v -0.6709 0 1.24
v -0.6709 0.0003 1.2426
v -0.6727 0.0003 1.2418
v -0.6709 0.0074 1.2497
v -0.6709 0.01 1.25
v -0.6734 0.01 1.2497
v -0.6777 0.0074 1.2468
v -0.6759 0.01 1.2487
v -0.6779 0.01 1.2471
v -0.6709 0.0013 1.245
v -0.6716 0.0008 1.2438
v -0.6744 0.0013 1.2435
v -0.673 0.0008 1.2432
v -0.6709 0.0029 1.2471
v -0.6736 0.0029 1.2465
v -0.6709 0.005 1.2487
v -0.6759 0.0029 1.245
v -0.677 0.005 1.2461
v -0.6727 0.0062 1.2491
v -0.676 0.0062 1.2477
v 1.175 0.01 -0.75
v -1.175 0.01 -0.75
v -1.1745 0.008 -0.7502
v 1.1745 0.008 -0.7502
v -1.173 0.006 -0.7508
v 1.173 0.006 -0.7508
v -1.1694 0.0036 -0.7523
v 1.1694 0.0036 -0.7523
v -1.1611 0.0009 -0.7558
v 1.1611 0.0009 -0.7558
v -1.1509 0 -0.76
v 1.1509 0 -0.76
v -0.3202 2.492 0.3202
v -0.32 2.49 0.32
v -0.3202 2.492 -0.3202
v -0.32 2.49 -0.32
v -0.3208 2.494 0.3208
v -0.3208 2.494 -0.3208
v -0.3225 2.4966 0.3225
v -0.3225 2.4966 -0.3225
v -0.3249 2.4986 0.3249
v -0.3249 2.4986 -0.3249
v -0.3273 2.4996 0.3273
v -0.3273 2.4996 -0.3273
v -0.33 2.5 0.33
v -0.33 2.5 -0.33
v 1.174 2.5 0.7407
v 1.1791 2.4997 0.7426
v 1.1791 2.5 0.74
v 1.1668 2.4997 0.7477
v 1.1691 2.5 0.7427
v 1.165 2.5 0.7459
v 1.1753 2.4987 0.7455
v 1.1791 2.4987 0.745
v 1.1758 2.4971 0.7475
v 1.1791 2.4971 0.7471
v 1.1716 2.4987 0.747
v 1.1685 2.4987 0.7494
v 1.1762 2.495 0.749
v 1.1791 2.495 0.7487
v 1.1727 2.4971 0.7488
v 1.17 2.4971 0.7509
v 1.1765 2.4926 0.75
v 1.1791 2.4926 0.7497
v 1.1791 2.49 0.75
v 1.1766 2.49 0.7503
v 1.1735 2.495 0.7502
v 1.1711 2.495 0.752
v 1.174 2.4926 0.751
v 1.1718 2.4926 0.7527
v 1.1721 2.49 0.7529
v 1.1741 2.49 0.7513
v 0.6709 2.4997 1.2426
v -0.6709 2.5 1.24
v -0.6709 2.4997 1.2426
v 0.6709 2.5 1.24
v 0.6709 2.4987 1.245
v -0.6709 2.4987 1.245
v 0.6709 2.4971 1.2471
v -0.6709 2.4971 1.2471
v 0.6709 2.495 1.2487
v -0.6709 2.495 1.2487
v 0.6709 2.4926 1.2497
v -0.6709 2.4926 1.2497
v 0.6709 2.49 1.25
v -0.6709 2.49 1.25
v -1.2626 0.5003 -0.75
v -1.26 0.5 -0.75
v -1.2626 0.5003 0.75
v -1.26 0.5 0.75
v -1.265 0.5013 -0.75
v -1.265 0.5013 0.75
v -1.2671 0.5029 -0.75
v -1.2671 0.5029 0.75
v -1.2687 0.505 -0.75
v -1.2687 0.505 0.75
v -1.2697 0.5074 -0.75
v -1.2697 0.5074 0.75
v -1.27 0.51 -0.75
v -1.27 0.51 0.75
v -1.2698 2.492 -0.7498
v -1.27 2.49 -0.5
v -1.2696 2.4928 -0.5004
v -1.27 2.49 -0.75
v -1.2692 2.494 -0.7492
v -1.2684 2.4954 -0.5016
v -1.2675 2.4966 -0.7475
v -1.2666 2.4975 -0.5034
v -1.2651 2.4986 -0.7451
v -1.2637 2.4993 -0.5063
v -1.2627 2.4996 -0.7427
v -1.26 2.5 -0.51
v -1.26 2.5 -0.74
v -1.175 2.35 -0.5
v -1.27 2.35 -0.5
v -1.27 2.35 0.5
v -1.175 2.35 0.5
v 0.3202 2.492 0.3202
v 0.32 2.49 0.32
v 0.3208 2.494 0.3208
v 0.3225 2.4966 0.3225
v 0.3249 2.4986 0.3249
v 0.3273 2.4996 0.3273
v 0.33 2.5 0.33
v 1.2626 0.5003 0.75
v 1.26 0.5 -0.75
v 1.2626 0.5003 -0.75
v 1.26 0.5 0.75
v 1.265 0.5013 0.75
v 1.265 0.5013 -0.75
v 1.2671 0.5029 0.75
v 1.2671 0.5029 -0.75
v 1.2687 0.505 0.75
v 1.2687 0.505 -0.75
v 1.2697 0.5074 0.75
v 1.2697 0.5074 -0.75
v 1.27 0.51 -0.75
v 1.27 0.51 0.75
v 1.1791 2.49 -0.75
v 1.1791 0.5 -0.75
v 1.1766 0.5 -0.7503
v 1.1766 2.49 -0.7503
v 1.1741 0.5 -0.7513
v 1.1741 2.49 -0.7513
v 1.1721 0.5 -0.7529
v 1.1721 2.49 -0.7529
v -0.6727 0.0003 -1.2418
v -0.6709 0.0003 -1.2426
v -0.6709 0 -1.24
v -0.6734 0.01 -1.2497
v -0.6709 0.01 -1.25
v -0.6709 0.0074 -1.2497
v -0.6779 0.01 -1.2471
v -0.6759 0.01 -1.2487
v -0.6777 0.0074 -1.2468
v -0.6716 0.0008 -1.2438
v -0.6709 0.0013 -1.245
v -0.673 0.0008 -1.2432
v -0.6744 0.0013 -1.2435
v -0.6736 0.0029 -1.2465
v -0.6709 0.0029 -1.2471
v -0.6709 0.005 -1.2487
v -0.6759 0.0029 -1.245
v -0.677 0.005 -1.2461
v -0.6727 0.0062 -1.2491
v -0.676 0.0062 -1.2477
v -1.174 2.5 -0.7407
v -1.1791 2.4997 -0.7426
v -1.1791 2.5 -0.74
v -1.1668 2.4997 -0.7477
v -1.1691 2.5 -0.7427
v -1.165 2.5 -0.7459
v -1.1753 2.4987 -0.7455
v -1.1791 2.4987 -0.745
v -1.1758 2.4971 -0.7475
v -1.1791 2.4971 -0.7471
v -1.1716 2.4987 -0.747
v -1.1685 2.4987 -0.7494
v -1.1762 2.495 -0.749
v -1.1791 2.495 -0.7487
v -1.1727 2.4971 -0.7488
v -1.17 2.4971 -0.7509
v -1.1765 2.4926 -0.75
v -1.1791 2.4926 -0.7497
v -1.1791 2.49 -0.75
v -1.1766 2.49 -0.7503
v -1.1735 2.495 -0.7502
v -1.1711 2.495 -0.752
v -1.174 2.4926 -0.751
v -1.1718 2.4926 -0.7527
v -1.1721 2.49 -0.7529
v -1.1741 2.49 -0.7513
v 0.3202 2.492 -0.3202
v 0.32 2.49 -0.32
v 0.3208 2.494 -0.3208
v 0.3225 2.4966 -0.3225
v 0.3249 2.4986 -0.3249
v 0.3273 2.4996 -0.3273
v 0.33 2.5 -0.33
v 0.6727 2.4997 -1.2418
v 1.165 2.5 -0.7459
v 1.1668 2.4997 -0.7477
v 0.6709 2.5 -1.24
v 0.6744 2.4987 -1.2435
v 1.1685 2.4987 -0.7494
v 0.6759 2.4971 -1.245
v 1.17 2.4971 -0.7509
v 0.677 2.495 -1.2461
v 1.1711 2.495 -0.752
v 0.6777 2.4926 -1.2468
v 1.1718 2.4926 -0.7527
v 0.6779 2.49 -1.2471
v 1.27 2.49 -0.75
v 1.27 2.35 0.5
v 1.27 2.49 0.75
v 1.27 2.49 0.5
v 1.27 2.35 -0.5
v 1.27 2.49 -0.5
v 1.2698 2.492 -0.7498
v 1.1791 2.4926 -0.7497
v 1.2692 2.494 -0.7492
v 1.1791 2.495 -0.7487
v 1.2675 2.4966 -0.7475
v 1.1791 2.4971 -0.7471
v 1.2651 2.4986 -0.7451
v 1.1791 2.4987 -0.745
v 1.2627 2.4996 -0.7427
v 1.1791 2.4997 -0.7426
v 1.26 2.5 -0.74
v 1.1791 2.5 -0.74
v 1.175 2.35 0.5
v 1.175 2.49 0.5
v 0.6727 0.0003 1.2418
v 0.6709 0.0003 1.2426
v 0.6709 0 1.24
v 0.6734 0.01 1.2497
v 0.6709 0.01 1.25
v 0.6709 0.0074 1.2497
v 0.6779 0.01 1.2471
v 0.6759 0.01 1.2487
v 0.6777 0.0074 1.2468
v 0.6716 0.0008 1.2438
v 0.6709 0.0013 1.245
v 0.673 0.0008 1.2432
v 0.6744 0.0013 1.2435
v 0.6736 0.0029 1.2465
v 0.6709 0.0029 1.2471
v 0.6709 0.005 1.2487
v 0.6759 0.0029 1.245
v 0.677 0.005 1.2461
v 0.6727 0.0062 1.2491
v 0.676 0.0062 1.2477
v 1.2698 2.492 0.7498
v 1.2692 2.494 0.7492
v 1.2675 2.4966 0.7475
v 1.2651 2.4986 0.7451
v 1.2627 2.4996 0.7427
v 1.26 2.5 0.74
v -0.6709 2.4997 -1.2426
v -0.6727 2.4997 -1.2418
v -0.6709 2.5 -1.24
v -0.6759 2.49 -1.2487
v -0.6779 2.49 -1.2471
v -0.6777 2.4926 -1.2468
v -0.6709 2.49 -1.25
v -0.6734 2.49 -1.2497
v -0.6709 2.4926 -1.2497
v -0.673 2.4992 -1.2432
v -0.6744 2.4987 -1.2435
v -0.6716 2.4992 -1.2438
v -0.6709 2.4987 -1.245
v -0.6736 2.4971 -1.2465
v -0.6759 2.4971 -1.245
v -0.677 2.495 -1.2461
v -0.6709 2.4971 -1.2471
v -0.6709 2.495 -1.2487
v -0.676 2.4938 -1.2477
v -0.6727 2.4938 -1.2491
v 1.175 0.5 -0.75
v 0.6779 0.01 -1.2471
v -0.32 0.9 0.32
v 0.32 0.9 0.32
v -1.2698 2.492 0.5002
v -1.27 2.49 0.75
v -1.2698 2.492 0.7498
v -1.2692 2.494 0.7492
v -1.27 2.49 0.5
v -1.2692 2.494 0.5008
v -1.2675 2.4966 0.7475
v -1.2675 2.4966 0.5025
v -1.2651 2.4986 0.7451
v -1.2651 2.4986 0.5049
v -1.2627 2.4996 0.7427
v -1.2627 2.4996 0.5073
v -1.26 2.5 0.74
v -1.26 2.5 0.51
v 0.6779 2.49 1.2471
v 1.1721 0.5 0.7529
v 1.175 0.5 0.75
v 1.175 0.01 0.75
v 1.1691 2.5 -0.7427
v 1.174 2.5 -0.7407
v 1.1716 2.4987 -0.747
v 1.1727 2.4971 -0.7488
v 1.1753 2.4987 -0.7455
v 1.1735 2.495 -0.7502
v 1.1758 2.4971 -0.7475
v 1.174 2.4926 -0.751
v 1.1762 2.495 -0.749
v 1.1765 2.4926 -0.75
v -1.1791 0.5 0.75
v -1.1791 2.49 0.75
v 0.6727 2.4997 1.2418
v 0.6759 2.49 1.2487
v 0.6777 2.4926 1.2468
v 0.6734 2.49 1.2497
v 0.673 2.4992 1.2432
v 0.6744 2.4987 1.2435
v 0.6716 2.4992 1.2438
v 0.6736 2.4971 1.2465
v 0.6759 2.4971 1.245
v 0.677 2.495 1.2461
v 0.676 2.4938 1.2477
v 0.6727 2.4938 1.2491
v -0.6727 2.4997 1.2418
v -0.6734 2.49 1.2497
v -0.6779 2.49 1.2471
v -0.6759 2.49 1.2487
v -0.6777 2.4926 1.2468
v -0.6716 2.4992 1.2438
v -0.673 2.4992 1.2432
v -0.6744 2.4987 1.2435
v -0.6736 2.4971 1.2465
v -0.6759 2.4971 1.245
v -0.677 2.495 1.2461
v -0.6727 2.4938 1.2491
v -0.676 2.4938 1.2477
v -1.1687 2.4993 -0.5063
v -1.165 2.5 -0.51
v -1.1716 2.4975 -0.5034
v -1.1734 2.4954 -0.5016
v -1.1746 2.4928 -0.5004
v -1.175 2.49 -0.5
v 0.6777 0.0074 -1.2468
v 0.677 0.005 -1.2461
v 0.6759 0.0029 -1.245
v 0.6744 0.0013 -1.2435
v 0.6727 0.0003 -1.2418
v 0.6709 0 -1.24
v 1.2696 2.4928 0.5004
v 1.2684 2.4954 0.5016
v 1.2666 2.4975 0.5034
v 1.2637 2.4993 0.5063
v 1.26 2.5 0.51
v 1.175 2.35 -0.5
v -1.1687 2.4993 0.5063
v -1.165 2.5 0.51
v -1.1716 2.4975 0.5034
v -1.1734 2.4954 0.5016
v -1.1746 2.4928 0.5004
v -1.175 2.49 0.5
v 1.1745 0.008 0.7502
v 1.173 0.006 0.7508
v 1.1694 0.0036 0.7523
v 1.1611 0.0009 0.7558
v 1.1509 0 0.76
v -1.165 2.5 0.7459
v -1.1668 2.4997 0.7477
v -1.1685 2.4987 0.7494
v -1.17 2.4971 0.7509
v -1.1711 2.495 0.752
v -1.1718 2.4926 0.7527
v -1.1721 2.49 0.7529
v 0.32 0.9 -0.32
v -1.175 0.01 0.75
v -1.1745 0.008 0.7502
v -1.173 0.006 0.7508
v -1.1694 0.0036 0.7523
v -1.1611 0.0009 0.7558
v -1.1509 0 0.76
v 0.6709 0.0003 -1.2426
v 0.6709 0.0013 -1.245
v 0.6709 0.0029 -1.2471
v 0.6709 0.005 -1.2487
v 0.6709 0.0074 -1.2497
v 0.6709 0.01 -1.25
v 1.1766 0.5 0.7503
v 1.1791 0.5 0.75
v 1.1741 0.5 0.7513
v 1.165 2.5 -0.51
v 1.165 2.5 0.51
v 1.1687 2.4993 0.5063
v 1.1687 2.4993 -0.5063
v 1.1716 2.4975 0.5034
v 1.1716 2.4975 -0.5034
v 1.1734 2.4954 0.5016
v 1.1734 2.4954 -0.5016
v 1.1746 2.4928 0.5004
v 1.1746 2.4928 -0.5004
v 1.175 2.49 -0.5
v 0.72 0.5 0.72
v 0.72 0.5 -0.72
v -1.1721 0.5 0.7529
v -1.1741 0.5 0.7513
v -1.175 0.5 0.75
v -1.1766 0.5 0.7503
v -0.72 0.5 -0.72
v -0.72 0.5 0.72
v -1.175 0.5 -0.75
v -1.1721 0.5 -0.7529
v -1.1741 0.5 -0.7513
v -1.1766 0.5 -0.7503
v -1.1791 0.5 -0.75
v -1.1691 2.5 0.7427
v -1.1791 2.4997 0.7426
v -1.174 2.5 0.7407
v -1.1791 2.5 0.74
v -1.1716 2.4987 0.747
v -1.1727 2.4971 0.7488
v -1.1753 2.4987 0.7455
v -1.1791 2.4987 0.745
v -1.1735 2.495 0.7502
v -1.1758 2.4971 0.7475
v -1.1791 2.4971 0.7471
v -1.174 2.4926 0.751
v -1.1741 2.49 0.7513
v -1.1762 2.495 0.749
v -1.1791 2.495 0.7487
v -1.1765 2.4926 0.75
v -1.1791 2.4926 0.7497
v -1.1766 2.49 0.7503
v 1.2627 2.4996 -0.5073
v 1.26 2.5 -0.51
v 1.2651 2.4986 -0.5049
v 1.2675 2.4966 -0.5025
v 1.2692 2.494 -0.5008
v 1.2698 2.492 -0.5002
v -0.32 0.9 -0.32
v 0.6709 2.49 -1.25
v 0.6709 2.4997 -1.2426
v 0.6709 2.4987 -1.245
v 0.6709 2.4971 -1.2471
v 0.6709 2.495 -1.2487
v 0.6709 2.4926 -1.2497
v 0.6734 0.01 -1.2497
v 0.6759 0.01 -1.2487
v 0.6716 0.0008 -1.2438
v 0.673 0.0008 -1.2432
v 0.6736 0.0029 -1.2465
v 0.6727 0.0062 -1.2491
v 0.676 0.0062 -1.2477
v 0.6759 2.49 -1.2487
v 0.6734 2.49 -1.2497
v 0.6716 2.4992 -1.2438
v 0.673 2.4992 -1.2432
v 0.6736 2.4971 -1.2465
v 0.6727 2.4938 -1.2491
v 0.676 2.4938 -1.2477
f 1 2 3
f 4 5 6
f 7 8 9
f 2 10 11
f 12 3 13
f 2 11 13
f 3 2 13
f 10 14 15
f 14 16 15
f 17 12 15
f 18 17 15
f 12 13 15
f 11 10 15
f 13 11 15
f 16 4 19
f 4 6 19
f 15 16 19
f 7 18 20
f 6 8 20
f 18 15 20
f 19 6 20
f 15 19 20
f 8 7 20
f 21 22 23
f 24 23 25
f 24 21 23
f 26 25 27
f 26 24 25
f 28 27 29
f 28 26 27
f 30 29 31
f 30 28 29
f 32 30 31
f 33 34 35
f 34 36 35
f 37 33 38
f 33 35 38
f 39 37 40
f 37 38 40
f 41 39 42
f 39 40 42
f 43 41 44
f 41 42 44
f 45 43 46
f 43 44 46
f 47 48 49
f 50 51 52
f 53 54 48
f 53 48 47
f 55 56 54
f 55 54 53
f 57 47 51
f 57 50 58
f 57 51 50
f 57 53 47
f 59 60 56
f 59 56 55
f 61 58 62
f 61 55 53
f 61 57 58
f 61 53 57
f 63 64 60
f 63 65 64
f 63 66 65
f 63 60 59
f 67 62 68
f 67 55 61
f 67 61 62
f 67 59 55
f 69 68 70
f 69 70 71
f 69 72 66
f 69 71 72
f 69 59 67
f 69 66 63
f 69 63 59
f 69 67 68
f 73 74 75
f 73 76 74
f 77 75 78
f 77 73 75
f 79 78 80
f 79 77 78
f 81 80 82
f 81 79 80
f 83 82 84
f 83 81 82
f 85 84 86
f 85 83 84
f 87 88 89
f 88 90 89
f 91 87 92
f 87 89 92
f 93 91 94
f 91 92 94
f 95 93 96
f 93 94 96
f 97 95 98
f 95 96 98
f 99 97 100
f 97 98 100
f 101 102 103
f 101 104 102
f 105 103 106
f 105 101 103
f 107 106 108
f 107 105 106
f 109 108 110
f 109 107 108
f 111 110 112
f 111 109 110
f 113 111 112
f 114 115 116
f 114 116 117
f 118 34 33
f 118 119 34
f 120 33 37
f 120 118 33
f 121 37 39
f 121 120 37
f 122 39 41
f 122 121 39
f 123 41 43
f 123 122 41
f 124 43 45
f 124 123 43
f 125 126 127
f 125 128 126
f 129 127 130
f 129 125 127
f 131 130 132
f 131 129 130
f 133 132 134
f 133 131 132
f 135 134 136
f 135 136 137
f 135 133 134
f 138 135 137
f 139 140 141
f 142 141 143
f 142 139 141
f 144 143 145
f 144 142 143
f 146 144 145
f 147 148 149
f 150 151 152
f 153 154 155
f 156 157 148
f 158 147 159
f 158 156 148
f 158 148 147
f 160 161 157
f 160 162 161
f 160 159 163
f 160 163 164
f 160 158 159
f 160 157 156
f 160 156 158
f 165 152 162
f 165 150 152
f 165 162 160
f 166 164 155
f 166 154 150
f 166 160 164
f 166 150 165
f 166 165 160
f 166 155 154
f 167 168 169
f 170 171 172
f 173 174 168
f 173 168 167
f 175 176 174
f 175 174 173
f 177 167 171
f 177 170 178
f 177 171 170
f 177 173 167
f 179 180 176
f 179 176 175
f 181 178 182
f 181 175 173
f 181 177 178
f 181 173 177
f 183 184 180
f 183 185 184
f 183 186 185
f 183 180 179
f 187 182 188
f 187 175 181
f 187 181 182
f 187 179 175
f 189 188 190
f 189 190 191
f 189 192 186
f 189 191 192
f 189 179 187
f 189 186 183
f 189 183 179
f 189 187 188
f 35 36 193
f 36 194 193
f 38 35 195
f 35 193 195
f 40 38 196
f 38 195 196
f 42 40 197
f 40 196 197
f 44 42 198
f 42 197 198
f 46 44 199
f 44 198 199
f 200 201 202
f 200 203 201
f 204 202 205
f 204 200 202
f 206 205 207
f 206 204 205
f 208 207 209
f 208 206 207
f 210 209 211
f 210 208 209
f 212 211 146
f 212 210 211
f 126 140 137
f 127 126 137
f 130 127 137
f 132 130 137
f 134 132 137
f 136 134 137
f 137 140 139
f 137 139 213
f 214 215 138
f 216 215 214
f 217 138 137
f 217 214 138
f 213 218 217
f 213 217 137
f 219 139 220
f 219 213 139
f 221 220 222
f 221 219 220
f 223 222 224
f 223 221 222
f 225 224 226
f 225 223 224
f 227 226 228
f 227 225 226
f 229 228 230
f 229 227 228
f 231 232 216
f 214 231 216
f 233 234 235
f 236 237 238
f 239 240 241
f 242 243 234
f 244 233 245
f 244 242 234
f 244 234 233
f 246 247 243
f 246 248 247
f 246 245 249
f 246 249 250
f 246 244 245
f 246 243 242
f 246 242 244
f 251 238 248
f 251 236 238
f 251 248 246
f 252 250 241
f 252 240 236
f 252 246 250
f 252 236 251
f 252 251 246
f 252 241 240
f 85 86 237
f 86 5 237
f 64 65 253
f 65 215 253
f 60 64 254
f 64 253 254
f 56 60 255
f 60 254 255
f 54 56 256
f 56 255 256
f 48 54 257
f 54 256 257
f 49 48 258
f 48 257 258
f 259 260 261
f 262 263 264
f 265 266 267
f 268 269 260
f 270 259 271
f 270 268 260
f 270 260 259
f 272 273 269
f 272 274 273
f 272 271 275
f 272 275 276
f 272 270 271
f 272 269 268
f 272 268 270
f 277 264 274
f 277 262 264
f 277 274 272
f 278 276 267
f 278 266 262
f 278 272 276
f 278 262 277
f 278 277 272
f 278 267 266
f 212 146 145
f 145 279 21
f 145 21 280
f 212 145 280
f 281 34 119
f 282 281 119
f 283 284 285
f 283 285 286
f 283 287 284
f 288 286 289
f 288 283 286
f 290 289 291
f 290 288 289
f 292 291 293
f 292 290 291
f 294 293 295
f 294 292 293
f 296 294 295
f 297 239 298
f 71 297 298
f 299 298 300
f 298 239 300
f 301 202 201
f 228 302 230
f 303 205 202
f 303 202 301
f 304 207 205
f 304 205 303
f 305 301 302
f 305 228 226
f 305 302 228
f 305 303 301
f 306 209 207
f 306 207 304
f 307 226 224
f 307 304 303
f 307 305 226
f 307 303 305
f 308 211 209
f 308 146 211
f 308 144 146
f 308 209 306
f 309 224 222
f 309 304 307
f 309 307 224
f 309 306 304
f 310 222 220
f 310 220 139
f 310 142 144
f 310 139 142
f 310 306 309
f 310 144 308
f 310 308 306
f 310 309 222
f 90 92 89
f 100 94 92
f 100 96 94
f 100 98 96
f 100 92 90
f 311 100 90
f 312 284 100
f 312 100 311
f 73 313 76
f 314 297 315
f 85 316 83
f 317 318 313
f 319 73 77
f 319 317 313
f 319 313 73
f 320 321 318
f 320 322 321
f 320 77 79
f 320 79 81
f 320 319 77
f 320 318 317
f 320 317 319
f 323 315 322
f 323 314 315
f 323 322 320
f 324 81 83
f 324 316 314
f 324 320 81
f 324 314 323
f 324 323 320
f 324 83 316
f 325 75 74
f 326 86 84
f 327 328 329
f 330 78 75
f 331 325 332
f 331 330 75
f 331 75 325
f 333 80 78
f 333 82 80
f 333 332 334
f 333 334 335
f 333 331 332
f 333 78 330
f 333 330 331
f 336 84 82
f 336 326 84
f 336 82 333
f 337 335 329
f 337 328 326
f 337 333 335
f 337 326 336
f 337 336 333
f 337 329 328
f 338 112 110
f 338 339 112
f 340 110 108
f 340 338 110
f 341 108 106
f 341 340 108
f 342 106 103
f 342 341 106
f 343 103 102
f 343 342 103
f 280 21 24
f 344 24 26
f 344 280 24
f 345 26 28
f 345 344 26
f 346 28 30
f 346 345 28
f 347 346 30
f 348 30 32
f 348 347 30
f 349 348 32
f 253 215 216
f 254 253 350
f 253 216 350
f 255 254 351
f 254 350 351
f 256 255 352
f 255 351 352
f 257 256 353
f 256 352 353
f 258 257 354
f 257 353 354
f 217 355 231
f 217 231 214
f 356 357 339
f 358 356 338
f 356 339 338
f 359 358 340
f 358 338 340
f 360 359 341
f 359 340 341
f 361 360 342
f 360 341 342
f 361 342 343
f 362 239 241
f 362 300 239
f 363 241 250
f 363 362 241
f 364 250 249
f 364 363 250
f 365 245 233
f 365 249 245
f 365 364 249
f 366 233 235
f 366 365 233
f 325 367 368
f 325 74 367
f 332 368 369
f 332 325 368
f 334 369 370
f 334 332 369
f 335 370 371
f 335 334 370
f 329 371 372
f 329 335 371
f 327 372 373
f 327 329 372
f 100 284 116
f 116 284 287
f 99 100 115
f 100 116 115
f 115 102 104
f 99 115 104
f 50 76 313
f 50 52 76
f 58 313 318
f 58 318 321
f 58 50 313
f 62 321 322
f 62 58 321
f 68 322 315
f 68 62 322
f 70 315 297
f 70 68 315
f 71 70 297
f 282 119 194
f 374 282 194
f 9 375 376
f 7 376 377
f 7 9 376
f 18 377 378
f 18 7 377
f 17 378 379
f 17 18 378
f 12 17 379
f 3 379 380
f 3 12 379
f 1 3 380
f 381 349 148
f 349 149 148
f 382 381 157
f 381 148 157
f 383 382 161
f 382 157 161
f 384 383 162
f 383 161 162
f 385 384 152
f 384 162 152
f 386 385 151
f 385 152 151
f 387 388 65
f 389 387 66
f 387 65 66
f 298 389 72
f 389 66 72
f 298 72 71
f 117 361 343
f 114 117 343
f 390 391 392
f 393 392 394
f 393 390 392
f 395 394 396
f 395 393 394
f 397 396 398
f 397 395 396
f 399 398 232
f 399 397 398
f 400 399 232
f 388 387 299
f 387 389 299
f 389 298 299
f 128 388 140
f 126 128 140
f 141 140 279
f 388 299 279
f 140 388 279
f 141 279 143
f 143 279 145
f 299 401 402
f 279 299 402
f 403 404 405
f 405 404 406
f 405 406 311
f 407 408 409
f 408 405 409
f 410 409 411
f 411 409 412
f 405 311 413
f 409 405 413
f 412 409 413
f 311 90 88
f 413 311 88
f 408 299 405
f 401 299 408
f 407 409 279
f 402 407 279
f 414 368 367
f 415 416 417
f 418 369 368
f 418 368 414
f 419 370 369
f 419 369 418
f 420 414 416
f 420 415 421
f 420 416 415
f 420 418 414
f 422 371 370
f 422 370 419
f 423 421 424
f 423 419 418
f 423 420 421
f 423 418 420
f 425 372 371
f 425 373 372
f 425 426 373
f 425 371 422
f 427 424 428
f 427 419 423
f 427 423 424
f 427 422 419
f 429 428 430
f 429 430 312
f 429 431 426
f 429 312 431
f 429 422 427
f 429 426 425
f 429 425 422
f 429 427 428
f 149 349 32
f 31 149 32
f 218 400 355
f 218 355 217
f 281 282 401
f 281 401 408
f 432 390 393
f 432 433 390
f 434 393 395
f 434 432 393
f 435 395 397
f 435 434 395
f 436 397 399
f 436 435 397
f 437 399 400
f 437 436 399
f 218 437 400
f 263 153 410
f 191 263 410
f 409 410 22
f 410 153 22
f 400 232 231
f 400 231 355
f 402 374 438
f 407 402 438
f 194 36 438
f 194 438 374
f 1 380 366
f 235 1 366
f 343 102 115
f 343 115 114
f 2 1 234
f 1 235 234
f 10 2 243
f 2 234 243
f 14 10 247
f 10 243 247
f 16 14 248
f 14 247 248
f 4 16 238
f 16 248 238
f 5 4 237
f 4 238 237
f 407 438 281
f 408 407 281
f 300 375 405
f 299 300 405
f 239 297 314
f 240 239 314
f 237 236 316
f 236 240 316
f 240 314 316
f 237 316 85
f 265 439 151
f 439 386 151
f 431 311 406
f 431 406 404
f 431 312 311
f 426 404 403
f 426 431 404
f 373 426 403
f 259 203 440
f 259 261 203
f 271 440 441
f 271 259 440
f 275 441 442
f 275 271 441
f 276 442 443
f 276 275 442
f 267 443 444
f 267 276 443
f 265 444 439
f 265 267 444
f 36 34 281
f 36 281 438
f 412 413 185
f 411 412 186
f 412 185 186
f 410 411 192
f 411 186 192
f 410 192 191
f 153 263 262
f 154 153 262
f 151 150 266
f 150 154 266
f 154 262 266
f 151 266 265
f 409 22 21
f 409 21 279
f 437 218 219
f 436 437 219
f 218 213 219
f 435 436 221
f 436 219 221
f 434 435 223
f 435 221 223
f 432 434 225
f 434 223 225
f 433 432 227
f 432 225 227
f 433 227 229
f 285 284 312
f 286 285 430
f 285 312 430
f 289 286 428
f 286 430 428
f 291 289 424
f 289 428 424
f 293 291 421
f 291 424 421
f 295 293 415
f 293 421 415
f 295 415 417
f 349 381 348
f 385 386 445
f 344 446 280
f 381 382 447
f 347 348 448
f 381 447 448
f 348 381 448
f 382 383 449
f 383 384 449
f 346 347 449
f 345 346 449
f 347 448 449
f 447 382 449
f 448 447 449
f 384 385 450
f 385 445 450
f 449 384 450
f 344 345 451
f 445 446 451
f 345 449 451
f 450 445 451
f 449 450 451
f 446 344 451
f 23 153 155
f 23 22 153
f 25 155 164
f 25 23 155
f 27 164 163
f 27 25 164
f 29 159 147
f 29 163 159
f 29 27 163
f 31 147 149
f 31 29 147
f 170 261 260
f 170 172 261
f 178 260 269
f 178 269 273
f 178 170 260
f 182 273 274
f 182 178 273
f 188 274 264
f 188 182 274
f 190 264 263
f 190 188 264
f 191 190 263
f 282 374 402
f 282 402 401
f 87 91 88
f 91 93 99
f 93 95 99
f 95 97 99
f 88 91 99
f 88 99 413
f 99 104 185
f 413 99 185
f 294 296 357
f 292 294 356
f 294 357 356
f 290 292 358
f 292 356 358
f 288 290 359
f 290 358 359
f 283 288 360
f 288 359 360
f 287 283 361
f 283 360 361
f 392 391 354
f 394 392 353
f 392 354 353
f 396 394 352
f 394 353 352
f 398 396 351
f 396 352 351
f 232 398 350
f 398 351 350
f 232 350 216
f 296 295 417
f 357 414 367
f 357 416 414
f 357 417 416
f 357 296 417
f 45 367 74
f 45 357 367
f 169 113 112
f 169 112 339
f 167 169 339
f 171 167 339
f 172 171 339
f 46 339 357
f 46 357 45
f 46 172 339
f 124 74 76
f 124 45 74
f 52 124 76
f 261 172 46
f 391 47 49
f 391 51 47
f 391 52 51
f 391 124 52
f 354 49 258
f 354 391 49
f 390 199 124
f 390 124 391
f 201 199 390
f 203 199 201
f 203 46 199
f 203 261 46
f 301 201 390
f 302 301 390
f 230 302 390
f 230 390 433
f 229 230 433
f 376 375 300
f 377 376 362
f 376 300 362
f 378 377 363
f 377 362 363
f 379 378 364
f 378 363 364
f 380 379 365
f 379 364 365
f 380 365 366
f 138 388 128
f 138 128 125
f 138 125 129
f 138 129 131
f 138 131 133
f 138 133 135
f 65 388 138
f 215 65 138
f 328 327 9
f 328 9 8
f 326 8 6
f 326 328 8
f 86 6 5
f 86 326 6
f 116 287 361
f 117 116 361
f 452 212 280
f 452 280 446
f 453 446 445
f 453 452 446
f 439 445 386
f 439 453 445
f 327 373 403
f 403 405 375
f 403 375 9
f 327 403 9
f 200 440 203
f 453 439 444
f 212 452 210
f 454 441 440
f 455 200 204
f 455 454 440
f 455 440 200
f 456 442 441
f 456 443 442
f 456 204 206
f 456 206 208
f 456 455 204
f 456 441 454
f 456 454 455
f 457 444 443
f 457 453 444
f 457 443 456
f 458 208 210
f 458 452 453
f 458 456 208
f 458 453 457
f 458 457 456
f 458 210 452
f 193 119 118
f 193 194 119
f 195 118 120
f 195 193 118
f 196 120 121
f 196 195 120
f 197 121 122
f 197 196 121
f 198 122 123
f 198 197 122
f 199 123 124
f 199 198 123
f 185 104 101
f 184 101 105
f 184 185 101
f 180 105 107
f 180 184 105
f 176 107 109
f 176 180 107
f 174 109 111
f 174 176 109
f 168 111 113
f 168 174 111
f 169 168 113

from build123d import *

# Parameters (mm, degrees)
BOSS_EXTRUDE1_DEPTH     = 2.5
SKETCH7_W               = 0.64
SKETCH7_H               = 0.64
CUT_EXTRUDE1_DEPTH      = 4.032016656
SKETCH8_W               = 0.095
SKETCH8_H               = 1.5
BOSS_EXTRUDE2_DEPTH     = 2.5
SKETCH9_W               = 0.095
SKETCH9_H               = 1
CUT_EXTRUDE2_DEPTH      = 0.15
CUT_EXTRUDE3_DEPTH      = 4.776784347
CUT_EXTRUDE3_DEPTH_BACK = 4.776784347
SKETCH12_W              = 1.5
SKETCH12_H              = 0.5
CHAMFER1_SIZE           = 0.4
FILLET1_R               = 0.01


with BuildPart() as part:
    # Sketch5 → Boss-Extrude1 (new body)
    with BuildSketch(Plane(origin=(0, 0, 0), x_dir=(1, 0, 0), z_dir=(0, 1, 0))):
        Polygon((-0.675, 1.25), (-1.175, 0.75), (-1.175, -0.75), (-0.675, -1.25), (0.675, -1.25), (1.175, -0.75), (1.175, 0.75), (0.675, 1.25), align=None)
    extrude(amount=BOSS_EXTRUDE1_DEPTH)

    # Sketch7 → Cut-Extrude1 (cut, through all)
    with BuildSketch(Plane(origin=(0, 2.5, 0), x_dir=(1, 0, 0), z_dir=(0, 1, 0))):
        Rectangle(SKETCH7_W, SKETCH7_H)
    extrude(amount=-CUT_EXTRUDE1_DEPTH, mode=Mode.SUBTRACT)

    # Sketch8 → Boss-Extrude2 (add)
    with BuildSketch(Plane(origin=(0, 2.5, 0), x_dir=(1, 0, 0), z_dir=(0, 1, 0))):
        with Locations((-1.2225, 0)):
            Rectangle(SKETCH8_W, SKETCH8_H)
        with Locations((1.2225, 0)):
            Rectangle(SKETCH8_W, SKETCH8_H)
    extrude(amount=-BOSS_EXTRUDE2_DEPTH)

    # Sketch9 → Cut-Extrude2 (cut)
    with BuildSketch(Plane(origin=(0, 2.5, 0), x_dir=(1, 0, 0), z_dir=(0, 1, 0))):
        with Locations((-1.2225, 0)):
            Rectangle(SKETCH9_W, SKETCH9_H)
        with Locations((1.2225, 0)):
            Rectangle(SKETCH9_W, SKETCH9_H)
    extrude(amount=-CUT_EXTRUDE2_DEPTH, mode=Mode.SUBTRACT)

    # Sketch12 → Cut-Extrude3 (cut, two sides: drawn at the far end of the back side and taken through both)
    with BuildSketch(Plane(origin=(1.27, 0, 0), x_dir=(0, 0, -1), z_dir=(1, 0, 0)).offset(-CUT_EXTRUDE3_DEPTH_BACK)):
        with Locations((0, 0.25)):
            Rectangle(SKETCH12_W, SKETCH12_H)
    extrude(amount=CUT_EXTRUDE3_DEPTH + CUT_EXTRUDE3_DEPTH_BACK, mode=Mode.SUBTRACT)

    # Chamfer1
    chamfer1_edges = [part.edges().sort_by_distance(p)[0] for p in [
        (0, 0.5, -0.32),
        (0.32, 0.5, 0),
        (0, 0.5, 0.32),
        (-0.32, 0.5, 0),
    ]]
    chamfer(chamfer1_edges, length=CHAMFER1_SIZE)

    # Fillet1
    fillet1_edges = [part.edges().sort_by_distance(p)[0] for p in [
        (-1.2225, 2.5, -0.75),
        (-0.925, 2.5, -1),
        (0, 2.5, -1.25),
        (0.925, 2.5, -1),
        (1.2225, 2.5, -0.75),
        (1.27, 2.5, -0.625),
        (1.2225, 2.5, -0.5),
        (1.175, 2.5, 0),
        (1.2225, 2.5, 0.5),
        (1.27, 2.5, 0.625),
        (1.2225, 2.5, 0.75),
        (0.925, 2.5, 1),
        (0, 2.5, 1.25),
        (-0.925, 2.5, 1),
        (-1.2225, 2.5, 0.75),
        (-1.27, 2.5, 0.625),
        (-1.2225, 2.5, 0.5),
        (-1.175, 2.5, 0),
        (-1.2225, 2.5, -0.5),
        (-1.27, 2.5, -0.625),
        (-0.32, 2.5, 0),
        (0, 2.5, 0.32),
        (0.32, 2.5, 0),
        (0, 2.5, -0.32),
        (0.925, 0, -1),
        (-0.925, 0, -1),
        (0, 0, -0.75),
        (-0.925, 0, 1),
        (0.925, 0, 1),
        (0, 0, 0.75),
        (0.675, 1.25, -1.25),
        (-0.675, 1.25, -1.25),
        (0, 0, -1.25),
        (-0.675, 1.25, 1.25),
        (0.675, 1.25, 1.25),
        (0, 0, 1.25),
        (-1.27, 0.5, 0),
        (1.27, 0.5, 0),
        (-1.175, 1.5, -0.75),
        (-1.175, 1.5, 0.75),
        (1.175, 1.5, -0.75),
        (1.175, 1.5, 0.75),
    ]]
    fillet(fillet1_edges, radius=FILLET1_R)


solid = part.part
